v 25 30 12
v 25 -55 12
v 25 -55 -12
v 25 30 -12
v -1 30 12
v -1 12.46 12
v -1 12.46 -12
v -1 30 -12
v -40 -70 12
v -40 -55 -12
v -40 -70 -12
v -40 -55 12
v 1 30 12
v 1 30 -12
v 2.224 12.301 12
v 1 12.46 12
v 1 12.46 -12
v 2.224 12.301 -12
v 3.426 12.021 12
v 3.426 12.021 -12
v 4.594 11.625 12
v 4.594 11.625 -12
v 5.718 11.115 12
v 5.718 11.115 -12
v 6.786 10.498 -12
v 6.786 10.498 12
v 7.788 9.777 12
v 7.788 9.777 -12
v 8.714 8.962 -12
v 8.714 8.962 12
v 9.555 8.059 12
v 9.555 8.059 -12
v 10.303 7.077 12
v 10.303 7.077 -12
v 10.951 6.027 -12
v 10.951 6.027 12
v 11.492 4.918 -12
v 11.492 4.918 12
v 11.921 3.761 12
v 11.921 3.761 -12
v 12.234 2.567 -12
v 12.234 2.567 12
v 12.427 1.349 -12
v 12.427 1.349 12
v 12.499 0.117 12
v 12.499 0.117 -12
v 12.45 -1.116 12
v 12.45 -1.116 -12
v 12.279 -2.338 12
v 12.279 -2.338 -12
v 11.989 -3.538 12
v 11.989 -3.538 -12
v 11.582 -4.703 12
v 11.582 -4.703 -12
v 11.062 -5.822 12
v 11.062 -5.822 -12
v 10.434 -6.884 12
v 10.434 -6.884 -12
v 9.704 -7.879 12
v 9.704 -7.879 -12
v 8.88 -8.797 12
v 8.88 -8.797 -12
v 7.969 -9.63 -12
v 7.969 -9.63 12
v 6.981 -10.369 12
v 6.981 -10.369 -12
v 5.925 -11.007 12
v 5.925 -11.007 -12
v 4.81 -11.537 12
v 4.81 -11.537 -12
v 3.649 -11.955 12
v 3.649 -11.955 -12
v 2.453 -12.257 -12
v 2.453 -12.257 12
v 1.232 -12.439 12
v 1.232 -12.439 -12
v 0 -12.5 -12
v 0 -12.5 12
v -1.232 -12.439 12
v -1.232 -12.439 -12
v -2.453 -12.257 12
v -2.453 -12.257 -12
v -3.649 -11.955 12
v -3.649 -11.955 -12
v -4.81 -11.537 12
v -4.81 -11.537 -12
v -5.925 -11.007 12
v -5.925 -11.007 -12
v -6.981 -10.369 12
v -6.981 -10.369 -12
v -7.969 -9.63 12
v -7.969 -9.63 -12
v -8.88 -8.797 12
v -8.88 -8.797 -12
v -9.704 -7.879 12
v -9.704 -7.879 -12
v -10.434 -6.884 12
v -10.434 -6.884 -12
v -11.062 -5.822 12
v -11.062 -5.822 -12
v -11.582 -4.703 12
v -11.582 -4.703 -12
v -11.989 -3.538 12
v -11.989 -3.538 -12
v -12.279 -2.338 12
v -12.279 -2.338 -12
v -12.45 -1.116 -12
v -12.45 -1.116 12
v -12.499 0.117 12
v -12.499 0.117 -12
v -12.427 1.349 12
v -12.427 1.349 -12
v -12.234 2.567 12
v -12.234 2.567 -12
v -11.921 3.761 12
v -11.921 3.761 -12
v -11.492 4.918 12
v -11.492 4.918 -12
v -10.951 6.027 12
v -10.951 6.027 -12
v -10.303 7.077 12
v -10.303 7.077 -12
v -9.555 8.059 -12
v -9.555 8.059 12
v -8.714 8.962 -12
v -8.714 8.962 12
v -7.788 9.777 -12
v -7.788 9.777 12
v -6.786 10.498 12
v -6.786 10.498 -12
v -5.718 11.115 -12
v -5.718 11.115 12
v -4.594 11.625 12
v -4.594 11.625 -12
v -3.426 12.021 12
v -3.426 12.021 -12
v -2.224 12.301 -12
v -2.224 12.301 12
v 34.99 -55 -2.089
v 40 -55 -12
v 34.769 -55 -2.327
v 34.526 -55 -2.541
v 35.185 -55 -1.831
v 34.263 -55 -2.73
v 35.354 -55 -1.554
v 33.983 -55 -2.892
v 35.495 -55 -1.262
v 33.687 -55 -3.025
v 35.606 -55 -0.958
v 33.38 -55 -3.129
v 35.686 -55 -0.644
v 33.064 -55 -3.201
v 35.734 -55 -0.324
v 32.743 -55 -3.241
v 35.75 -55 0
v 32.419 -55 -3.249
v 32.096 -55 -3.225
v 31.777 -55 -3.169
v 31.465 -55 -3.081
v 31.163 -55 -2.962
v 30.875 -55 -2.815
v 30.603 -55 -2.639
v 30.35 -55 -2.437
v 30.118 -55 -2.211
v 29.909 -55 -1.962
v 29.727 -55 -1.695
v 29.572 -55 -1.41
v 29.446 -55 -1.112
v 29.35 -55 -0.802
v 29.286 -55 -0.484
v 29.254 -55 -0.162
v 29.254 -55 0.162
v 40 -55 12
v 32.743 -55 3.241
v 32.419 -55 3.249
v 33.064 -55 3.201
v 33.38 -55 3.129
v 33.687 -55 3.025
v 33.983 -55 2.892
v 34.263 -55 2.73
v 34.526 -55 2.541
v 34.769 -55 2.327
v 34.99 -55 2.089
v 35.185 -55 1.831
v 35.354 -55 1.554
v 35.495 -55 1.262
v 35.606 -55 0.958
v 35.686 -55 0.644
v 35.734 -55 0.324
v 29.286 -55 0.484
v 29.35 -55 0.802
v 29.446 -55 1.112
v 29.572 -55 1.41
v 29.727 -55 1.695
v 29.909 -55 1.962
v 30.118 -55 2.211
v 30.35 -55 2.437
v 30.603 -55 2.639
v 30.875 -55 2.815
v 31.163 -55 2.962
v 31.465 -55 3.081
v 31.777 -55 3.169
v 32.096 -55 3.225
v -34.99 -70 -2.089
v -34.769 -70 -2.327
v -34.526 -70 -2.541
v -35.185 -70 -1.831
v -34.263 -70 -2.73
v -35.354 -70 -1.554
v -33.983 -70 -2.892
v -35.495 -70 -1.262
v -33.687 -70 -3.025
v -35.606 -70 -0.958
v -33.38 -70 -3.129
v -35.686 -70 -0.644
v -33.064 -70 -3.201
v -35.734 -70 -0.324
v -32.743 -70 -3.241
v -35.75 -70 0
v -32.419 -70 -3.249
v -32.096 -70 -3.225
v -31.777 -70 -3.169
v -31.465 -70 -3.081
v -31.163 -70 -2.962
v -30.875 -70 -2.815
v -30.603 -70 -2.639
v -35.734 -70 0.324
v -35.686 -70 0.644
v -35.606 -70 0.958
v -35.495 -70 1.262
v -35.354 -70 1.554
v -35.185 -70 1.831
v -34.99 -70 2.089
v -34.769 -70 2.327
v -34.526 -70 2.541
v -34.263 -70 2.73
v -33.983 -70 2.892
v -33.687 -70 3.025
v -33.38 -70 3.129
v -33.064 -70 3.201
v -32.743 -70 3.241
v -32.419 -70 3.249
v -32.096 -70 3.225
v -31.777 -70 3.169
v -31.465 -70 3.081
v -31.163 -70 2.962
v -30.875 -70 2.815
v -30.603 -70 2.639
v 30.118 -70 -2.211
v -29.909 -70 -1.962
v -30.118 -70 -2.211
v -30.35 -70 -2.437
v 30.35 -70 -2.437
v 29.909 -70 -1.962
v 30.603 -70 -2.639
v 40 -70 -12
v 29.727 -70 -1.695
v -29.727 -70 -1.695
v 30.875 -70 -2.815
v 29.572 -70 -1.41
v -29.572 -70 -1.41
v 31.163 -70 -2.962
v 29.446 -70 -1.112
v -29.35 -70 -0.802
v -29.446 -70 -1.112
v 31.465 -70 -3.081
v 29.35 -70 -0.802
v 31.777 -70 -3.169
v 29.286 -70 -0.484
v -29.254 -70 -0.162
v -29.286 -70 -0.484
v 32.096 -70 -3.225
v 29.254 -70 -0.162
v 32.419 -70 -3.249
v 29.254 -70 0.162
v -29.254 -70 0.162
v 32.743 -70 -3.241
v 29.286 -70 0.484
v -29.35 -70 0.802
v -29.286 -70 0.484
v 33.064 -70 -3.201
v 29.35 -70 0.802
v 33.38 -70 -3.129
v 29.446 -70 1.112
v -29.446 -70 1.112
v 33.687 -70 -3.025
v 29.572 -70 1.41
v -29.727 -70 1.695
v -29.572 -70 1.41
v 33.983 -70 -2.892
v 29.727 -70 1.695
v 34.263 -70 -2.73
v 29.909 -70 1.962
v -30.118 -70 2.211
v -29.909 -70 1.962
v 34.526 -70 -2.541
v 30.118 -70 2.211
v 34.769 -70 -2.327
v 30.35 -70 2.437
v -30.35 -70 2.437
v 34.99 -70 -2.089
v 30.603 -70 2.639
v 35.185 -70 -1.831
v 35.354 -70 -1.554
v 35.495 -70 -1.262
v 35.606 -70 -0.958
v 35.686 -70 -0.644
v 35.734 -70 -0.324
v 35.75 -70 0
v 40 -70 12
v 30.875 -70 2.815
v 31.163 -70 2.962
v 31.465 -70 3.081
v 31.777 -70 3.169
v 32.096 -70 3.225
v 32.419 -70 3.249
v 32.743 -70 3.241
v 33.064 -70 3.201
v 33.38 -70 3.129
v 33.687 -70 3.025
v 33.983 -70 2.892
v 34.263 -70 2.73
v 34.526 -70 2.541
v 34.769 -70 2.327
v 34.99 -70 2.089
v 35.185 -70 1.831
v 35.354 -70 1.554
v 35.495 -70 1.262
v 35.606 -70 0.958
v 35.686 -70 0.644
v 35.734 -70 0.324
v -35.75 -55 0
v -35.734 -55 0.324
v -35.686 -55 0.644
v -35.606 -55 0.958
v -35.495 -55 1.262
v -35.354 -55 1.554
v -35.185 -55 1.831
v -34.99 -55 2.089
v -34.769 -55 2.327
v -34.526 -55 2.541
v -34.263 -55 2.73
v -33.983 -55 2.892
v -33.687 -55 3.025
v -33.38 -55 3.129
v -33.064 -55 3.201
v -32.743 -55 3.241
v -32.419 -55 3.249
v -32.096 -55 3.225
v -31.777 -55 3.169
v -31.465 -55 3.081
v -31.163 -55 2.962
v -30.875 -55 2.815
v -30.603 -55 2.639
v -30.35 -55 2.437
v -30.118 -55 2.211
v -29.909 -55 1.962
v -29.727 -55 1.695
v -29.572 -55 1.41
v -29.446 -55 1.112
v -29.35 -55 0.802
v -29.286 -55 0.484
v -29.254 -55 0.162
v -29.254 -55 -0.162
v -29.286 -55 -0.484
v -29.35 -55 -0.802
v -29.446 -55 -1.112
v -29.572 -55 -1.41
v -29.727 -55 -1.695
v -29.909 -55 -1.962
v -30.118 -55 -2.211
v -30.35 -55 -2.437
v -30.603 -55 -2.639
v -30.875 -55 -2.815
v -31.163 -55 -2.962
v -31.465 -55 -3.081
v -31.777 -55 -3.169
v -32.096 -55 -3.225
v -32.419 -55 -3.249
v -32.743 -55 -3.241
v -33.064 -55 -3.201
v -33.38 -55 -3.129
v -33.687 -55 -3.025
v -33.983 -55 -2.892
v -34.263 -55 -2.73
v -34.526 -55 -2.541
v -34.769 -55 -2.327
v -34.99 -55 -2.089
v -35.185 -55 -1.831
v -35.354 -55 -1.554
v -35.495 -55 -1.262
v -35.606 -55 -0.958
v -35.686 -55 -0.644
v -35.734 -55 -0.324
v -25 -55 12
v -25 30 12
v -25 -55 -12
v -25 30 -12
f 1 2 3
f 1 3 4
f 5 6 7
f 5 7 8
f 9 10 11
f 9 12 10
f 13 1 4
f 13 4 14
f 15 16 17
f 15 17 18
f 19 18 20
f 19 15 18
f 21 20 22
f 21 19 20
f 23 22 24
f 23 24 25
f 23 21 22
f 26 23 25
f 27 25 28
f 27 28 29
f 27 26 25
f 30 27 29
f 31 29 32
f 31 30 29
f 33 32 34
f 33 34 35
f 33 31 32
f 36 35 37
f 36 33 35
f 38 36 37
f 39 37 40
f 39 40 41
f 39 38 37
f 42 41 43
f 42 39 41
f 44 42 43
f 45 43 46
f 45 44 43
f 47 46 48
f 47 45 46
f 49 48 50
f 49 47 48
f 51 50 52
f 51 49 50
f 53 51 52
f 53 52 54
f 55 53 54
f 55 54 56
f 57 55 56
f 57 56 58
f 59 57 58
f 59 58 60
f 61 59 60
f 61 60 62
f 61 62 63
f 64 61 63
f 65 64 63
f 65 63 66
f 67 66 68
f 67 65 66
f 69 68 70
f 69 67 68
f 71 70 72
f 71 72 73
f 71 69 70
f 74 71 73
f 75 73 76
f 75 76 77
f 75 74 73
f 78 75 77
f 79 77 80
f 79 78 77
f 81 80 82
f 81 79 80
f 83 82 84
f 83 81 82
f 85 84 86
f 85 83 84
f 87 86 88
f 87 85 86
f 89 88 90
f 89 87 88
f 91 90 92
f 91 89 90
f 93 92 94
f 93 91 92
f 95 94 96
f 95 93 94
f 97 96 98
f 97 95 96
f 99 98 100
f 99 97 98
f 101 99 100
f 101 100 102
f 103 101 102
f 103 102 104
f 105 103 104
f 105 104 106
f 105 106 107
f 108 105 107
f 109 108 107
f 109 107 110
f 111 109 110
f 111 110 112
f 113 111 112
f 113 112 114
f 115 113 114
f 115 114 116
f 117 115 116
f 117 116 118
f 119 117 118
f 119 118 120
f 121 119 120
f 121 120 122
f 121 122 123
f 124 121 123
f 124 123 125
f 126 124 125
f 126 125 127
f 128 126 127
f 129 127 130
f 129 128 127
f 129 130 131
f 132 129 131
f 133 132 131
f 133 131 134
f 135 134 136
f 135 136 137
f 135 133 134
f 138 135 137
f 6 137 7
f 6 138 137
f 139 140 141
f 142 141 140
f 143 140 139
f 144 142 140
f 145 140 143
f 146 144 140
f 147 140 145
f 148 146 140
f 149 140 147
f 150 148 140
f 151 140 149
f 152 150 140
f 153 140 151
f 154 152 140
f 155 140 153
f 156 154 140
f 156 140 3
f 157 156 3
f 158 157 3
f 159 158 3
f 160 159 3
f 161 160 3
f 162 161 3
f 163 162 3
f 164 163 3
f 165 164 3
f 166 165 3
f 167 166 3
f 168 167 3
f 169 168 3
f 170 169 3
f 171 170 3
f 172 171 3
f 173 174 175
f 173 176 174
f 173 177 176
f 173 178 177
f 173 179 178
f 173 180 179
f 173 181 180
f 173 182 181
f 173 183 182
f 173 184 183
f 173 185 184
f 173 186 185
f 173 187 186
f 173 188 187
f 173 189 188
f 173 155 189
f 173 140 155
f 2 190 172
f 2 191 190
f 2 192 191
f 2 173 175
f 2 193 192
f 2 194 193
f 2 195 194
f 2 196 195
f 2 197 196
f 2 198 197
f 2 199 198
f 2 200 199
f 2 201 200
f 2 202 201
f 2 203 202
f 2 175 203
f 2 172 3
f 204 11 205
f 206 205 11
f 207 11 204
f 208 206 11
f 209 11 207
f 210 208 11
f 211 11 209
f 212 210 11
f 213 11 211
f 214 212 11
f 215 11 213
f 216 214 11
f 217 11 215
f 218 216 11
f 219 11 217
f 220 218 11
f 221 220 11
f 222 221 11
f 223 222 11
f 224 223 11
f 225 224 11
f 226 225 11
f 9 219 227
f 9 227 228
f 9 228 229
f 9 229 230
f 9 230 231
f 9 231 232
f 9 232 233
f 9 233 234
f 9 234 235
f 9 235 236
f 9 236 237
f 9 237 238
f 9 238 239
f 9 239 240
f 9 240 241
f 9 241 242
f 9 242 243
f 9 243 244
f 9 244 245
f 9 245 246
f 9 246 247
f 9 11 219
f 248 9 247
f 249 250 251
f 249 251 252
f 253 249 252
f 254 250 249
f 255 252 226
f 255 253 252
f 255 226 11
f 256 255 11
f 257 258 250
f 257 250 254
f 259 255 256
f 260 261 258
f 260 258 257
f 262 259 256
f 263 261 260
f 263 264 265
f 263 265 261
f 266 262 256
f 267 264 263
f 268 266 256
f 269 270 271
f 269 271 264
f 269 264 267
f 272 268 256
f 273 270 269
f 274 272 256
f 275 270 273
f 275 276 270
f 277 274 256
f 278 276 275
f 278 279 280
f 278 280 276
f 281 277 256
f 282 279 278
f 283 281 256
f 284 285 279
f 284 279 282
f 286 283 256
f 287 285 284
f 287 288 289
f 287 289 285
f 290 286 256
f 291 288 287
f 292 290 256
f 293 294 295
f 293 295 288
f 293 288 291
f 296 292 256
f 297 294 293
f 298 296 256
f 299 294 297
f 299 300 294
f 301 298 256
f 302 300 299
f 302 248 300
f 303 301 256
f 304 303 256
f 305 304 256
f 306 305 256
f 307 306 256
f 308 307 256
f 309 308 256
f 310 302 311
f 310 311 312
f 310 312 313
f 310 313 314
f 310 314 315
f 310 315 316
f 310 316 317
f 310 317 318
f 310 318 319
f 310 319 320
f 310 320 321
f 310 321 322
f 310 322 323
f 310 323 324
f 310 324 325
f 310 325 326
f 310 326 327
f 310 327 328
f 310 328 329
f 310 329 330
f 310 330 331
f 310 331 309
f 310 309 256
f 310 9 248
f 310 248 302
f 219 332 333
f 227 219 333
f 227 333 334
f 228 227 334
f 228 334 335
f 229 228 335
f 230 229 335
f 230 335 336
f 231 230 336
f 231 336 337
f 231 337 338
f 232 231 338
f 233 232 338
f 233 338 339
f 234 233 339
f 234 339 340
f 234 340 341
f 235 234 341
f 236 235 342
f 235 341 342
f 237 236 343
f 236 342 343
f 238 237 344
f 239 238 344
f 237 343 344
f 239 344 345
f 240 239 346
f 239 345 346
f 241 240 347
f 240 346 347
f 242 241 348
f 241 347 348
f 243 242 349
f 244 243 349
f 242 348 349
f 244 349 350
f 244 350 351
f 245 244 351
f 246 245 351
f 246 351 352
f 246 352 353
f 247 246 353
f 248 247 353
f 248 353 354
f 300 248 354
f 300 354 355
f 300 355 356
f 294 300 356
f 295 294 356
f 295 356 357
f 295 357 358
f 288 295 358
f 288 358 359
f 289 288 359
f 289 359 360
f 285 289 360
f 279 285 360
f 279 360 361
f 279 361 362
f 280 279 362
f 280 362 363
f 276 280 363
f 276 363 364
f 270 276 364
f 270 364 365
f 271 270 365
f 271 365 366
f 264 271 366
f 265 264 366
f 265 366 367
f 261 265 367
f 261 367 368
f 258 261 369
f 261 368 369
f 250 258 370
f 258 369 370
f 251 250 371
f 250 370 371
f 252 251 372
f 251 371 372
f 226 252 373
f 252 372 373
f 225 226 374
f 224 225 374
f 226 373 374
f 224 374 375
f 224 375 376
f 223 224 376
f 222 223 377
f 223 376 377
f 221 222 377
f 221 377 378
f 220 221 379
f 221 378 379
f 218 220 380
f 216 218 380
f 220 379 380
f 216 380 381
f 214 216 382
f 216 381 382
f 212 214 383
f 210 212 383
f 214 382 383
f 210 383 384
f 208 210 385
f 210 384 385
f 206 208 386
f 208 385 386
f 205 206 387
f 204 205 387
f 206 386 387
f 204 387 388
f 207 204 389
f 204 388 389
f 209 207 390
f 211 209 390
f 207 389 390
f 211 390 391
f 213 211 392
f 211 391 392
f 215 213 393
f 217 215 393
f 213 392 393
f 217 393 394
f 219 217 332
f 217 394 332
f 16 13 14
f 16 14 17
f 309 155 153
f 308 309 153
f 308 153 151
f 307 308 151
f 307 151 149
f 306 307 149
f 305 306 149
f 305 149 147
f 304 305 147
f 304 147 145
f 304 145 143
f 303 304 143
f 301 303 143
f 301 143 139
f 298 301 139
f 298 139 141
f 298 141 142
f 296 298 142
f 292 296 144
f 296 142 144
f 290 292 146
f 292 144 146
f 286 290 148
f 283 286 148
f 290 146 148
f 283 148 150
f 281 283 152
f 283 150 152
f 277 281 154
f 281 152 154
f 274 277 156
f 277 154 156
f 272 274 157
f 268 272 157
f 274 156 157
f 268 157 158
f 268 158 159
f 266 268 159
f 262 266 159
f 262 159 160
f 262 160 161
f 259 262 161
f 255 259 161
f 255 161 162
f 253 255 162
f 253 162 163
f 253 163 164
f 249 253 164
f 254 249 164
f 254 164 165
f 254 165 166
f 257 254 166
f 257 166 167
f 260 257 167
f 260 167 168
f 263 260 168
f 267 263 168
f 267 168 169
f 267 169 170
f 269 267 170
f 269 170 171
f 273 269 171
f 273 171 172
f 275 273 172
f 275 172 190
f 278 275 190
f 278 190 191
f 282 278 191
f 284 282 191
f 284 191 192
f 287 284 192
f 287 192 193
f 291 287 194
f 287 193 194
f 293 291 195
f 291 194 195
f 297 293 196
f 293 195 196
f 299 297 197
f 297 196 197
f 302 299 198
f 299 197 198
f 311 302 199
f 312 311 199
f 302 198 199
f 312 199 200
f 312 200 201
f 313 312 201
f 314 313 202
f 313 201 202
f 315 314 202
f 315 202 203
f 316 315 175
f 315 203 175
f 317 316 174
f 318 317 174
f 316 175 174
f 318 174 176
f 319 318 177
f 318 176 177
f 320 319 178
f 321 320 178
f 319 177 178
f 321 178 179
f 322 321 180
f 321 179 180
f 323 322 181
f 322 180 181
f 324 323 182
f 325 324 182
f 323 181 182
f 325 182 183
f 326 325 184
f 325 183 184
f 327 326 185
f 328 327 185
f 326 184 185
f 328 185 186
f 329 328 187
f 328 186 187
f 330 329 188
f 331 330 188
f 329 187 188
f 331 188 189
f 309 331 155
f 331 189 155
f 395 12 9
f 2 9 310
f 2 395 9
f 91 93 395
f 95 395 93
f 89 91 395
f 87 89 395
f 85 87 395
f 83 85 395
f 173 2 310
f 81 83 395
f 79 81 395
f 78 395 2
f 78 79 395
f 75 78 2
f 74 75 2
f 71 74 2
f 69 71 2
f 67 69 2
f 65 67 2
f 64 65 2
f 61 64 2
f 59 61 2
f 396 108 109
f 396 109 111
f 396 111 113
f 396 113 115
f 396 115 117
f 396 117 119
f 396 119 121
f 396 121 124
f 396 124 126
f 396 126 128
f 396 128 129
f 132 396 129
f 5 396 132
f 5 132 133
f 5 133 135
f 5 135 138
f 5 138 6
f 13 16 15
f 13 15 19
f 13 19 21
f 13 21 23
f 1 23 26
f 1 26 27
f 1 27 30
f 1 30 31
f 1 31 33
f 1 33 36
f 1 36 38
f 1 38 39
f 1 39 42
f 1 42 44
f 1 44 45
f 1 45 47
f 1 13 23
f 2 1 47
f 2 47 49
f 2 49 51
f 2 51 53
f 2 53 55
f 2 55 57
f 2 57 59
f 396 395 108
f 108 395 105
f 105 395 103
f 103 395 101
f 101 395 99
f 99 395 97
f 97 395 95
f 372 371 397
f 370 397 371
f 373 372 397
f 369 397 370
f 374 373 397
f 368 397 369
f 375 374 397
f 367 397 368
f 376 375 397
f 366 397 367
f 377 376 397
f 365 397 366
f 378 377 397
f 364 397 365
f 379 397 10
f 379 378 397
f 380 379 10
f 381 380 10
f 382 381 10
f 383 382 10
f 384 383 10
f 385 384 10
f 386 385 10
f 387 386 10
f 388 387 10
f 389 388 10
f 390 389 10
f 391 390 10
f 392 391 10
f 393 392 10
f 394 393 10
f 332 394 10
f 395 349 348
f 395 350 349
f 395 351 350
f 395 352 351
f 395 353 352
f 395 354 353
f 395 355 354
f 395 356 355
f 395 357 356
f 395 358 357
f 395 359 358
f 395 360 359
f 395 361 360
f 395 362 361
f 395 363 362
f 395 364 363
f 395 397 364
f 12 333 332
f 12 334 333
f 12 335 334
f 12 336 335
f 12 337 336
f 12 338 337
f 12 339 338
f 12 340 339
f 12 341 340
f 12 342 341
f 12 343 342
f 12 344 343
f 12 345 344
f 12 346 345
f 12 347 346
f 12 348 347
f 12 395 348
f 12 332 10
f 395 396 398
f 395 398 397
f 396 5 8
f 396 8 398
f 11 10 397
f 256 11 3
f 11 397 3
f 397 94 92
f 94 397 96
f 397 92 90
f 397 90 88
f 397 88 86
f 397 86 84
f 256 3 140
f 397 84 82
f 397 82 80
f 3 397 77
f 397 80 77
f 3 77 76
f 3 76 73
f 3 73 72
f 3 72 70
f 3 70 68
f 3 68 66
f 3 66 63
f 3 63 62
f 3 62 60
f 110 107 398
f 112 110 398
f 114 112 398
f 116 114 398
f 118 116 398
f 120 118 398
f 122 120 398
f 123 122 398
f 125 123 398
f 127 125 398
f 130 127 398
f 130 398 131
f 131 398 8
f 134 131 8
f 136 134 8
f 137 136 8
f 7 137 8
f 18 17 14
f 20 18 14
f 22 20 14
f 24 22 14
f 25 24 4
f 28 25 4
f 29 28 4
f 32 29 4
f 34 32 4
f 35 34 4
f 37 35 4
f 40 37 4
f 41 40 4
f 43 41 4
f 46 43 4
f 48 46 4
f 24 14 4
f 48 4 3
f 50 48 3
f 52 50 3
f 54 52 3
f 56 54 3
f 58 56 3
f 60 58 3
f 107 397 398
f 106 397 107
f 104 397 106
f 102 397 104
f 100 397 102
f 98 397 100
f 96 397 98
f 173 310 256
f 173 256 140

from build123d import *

# Parameters (mm, degrees)
EXTRUDE_1_DEPTH     = 12
SKETCH_2_R          = 3.25
CUT_EXTRUDE_1_DEPTH = 95.704804524


with BuildPart() as part:
    # Эскиз1 → Бобышка-Вытянуть1 (new, symmetric)
    with BuildSketch(Plane.XY):
        with BuildLine():
            Line((-40, -70), (40, -70))
            Line((40, -70), (40, -55))
            Line((40, -55), (25, -55))
            Line((25, -55), (25, 30))
            Line((25, 30), (1, 30))
            Line((1, 30), (1, 12.459935794))
            ThreePointArc((1, 12.459935794), (0, -12.5), (-1, 12.459935794))
            Line((-1, 12.459935794), (-1, 30))
            Line((-1, 30), (-25, 30))
            Line((-25, 30), (-25, -55))
            Line((-25, -55), (-40, -55))
            Line((-40, -55), (-40, -70))
        make_face()
    extrude(amount=EXTRUDE_1_DEPTH, both=True)

    # Эскиз2 → Вырез-Вытянуть1 (cut, through all)
    with BuildSketch(Plane(origin=(0, -55, 0), x_dir=(1, 0, 0), z_dir=(0, 1, 0))):
        with Locations((-32.5, 0)):
            Circle(SKETCH_2_R)
        with Locations((32.5, 0)):
            Circle(SKETCH_2_R)
    extrude(amount=-CUT_EXTRUDE_1_DEPTH, mode=Mode.SUBTRACT)


solid = part.part
